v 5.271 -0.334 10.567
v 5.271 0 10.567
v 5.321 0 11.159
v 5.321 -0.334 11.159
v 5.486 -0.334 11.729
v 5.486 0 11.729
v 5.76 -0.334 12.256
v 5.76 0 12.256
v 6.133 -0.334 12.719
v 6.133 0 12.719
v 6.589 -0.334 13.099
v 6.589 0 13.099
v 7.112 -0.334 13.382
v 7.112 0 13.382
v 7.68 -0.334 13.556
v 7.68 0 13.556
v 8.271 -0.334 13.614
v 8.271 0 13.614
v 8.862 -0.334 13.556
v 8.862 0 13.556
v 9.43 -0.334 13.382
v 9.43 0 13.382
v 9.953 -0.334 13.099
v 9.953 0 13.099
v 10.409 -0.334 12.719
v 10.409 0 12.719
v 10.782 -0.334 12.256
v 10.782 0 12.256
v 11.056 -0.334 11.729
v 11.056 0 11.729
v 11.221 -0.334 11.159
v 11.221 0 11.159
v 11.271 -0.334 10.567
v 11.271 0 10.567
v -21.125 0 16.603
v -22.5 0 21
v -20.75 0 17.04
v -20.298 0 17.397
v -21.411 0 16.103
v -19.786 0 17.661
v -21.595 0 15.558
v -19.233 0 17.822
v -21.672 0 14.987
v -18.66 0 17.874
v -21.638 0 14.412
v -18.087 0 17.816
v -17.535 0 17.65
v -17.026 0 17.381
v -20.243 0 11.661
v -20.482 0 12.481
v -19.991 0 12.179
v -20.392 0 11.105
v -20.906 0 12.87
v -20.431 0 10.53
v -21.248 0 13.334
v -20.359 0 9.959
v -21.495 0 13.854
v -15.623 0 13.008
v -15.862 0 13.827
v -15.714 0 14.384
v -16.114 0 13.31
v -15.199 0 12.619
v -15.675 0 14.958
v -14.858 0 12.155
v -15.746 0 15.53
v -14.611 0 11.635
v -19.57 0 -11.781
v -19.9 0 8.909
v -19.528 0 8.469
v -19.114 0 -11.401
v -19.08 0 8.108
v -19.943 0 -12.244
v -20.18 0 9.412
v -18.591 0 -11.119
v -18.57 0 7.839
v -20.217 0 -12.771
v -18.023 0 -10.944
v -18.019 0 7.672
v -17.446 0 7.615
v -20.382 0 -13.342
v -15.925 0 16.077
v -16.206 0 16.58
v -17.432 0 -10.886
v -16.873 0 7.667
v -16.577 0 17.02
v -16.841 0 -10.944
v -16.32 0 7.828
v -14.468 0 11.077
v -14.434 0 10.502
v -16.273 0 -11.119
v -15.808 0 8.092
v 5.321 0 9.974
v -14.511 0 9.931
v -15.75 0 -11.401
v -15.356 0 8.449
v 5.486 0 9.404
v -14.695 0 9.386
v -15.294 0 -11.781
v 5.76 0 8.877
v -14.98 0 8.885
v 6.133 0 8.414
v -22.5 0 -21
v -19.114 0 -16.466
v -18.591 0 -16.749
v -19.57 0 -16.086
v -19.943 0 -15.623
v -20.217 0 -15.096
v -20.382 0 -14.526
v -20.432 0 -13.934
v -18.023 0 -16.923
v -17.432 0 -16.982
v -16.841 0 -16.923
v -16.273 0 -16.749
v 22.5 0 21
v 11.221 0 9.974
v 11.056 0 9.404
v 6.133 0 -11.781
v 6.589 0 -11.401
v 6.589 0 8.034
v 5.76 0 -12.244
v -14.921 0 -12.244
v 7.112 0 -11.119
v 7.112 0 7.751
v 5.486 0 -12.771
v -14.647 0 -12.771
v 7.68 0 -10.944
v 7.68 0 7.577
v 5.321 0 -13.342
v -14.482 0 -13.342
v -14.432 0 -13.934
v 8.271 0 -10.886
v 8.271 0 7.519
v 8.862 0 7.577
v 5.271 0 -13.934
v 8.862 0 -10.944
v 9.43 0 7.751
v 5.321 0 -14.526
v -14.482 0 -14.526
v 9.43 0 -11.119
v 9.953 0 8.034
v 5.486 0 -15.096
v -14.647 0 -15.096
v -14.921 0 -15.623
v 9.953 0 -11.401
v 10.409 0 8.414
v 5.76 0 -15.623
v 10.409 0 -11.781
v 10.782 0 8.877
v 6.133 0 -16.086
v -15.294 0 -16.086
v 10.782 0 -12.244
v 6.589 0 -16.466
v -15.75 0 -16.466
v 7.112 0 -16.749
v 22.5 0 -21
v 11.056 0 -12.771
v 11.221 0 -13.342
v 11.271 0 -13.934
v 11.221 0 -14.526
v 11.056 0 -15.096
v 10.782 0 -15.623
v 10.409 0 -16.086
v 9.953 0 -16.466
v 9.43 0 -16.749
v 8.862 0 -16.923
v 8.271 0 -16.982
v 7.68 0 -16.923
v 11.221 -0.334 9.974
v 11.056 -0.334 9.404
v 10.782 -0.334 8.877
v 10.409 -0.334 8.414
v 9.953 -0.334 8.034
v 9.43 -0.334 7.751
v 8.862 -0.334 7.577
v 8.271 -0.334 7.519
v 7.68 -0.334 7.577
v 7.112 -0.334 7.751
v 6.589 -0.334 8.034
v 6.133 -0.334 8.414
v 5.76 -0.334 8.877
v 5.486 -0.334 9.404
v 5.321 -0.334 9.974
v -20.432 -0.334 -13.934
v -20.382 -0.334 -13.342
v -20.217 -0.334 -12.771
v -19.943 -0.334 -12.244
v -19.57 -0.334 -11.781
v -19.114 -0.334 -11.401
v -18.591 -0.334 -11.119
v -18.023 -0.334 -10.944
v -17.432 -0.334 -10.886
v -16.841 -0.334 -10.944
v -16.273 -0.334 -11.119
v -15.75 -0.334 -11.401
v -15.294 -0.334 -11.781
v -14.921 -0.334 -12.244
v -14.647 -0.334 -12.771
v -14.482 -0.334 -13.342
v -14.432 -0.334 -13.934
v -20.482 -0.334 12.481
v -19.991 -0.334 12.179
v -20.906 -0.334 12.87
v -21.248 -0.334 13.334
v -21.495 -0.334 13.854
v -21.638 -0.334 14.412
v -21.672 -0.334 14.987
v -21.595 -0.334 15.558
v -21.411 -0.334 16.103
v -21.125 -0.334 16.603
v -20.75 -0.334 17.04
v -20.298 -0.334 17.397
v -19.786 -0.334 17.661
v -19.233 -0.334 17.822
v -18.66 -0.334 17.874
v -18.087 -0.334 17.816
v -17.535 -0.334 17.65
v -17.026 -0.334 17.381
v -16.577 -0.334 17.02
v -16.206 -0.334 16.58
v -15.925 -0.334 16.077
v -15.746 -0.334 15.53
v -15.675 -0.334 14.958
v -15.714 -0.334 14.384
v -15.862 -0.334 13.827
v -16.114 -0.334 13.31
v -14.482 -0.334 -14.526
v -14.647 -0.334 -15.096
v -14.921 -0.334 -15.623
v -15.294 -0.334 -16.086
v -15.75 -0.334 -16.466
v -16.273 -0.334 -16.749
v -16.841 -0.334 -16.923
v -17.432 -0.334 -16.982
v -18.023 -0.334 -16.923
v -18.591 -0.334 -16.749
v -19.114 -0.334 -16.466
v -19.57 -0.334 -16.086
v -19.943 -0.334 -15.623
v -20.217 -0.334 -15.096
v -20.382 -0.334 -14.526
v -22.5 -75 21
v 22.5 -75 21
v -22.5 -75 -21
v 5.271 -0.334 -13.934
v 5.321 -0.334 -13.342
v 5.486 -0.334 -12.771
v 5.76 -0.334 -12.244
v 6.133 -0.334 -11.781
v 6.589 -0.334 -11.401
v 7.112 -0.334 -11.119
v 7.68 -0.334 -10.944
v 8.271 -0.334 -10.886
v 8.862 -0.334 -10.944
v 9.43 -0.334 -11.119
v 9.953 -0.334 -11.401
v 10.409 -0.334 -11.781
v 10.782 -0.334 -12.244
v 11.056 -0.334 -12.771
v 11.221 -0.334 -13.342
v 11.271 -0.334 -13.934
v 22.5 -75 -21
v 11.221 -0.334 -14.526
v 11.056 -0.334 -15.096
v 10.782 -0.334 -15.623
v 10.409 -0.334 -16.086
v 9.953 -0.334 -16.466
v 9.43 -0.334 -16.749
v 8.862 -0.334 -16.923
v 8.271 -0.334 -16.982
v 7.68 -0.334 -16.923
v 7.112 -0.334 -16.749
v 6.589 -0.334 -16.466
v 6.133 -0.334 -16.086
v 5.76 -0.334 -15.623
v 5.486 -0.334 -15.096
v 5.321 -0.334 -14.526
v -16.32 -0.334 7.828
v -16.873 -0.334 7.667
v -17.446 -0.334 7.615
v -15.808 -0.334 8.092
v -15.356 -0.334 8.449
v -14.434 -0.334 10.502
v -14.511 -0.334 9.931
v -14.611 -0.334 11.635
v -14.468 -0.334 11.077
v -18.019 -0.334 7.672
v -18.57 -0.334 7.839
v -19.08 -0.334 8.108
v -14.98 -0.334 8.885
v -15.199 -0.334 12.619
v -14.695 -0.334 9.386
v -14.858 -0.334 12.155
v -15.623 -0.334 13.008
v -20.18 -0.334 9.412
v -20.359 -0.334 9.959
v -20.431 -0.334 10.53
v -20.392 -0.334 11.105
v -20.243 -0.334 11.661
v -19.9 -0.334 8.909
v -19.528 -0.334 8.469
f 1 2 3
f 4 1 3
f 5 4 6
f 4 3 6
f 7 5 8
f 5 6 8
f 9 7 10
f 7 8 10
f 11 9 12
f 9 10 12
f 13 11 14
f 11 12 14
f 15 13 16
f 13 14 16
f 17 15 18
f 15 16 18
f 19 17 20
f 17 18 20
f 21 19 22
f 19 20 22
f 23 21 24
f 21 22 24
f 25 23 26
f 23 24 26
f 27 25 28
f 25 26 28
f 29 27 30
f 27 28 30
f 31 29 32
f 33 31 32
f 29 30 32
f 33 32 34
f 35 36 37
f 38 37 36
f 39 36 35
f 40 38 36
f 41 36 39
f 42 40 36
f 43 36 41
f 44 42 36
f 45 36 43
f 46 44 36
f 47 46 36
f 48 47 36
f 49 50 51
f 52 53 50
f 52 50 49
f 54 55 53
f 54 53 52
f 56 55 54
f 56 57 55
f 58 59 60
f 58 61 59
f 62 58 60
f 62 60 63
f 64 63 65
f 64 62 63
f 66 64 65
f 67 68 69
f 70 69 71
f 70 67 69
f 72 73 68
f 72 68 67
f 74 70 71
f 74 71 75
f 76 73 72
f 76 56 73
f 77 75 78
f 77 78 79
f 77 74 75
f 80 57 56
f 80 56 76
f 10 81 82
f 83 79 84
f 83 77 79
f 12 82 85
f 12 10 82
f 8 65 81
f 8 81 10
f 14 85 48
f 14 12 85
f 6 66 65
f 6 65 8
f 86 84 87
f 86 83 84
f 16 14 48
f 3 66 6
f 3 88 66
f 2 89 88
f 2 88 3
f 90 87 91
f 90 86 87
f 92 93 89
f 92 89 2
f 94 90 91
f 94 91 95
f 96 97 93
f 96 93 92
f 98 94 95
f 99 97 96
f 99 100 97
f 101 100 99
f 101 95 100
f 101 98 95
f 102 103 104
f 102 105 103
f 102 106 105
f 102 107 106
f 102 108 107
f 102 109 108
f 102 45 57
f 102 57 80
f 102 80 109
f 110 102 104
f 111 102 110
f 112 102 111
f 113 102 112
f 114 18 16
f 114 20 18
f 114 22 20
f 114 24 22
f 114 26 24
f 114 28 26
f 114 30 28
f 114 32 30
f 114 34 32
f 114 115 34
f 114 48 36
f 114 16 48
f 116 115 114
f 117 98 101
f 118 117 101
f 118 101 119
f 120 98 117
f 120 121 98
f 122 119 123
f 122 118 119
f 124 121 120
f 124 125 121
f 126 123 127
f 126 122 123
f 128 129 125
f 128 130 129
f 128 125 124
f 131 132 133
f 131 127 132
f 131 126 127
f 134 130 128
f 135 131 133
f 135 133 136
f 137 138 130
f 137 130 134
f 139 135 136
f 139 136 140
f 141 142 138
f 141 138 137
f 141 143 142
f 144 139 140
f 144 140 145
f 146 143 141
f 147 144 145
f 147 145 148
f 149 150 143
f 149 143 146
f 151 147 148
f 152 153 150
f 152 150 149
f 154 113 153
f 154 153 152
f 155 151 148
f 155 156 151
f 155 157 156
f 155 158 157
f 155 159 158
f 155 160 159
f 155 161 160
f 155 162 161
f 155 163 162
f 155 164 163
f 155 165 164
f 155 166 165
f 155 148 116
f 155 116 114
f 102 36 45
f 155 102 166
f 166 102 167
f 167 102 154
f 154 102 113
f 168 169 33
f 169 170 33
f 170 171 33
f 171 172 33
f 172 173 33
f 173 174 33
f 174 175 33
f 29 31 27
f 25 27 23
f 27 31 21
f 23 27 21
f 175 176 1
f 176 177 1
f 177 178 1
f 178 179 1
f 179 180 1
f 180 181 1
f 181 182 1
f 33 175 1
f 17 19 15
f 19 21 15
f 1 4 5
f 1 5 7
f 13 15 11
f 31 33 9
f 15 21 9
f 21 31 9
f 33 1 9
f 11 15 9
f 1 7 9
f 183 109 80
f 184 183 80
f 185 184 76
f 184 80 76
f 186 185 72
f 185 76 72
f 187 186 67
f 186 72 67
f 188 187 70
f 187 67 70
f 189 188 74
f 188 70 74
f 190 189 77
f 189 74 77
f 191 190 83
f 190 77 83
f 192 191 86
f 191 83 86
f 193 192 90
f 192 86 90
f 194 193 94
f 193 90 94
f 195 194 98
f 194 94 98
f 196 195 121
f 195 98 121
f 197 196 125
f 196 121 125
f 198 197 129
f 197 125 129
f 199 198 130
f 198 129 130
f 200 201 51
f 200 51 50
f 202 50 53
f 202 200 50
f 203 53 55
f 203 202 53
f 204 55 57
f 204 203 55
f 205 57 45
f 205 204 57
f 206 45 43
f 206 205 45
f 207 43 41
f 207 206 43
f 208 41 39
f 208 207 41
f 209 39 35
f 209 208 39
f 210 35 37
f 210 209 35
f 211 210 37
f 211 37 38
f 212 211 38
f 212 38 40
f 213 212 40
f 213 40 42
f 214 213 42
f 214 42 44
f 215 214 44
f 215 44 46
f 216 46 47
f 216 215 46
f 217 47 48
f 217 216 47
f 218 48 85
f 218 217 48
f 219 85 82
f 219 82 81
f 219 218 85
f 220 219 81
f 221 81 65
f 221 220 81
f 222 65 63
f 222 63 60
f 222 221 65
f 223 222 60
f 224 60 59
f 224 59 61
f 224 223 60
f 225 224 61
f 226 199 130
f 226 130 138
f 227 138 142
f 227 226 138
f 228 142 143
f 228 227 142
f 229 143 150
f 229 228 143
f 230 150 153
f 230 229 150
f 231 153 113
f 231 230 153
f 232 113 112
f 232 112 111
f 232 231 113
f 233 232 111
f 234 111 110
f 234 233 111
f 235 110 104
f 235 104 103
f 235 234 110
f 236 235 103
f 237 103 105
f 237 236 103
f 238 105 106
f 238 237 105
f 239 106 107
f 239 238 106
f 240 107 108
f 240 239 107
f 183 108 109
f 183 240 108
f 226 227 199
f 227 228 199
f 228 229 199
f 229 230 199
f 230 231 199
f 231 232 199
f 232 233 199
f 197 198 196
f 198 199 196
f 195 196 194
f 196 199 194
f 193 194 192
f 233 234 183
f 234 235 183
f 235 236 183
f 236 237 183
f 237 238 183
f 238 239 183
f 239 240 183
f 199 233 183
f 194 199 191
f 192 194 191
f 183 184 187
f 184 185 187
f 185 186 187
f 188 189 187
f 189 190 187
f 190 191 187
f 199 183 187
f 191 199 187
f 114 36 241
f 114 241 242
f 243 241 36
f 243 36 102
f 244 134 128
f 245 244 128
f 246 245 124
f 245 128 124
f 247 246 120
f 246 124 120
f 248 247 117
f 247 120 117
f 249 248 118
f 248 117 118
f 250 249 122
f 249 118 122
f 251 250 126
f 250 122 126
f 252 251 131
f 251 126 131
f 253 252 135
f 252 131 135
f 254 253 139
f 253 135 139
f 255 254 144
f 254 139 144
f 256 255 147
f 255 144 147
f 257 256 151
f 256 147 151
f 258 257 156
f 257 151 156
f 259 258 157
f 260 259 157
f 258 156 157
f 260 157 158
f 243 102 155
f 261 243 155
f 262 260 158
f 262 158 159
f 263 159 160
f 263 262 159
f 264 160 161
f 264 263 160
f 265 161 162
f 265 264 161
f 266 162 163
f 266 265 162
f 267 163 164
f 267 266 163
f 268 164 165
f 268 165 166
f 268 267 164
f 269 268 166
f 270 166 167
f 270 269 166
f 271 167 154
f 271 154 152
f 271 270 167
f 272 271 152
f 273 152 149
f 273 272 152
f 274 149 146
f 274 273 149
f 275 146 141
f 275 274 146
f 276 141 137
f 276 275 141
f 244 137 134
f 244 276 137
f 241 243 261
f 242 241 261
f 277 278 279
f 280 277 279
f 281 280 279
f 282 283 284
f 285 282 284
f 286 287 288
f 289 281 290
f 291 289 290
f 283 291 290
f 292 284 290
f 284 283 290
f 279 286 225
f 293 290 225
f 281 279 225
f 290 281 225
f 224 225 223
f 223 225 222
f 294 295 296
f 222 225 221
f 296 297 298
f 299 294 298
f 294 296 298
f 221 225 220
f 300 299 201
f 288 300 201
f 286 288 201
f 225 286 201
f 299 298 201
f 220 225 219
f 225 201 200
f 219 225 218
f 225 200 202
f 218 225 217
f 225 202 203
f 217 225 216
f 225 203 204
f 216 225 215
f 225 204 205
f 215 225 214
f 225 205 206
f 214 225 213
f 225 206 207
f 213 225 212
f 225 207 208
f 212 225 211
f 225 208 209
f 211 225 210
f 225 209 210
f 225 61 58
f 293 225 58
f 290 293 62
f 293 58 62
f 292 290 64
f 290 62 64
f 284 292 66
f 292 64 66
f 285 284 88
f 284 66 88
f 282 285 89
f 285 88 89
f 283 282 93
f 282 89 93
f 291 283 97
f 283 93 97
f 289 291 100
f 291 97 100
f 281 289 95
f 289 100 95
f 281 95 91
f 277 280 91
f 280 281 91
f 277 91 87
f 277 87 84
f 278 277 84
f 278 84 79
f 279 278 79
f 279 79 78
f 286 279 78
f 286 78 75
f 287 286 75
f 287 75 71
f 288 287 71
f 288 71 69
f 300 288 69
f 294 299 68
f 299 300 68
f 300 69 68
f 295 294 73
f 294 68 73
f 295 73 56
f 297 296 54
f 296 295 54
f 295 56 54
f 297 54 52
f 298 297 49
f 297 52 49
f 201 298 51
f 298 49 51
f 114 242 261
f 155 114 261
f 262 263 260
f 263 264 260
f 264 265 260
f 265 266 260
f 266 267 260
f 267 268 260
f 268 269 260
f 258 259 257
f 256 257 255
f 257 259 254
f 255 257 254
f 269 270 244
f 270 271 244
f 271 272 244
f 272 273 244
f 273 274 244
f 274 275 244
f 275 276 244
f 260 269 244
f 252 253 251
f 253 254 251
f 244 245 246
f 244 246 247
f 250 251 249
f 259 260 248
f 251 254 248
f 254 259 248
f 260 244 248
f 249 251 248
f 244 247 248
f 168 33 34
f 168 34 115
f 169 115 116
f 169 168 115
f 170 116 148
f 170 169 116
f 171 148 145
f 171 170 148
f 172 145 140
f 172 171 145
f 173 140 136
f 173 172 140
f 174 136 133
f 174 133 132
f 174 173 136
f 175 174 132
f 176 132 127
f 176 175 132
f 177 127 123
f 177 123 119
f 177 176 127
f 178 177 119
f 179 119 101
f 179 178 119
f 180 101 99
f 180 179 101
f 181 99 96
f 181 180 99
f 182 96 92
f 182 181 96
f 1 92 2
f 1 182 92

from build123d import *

# Parameters (mm, degrees)
CROQUIS1_W                            = 45
CROQUIS1_H                            = 42
SALIENTE_EXTRUIR1_DEPTH               = 75
CROQUIS3_W                            = 3
CROQUIS3_H                            = 1
TALADRO_DE_MARGEN_PARA_M61_AT_2_COUNT = 2
TALADRO_DE_MARGEN_PARA_M61_AT_2_PITCH = 25.702920672
TALADRO_DE_MARGEN_PARA_M61_AT_3_COUNT = 2
TALADRO_DE_MARGEN_PARA_M61_AT_3_PITCH = 35.509059169
TALADRO_DE_MARGEN_PARA_M61_AT_4_COUNT = 2
TALADRO_DE_MARGEN_PARA_M61_AT_4_PITCH = 24.500064327
TALADRO_START                         = -0.333644058
TALADRO_DE_MARGEN_PARA_M62_DEPTH      = 0.333644058


# Read off the part's stored shape, not the designer's step: Taladro de margen para M62
with BuildPart() as part:
    # Croquis1 → Saliente-Extruir1 (new body)
    with BuildSketch(Plane(origin=(0, 0, 0), x_dir=(1, 0, 0), z_dir=(0, 1, 0))):
        Rectangle(CROQUIS1_W, CROQUIS1_H)
    extrude(amount=-SALIENTE_EXTRUIR1_DEPTH)

    # Croquis3 → Taladro de margen para M61 (revolve, cut)
    with BuildSketch(Plane(origin=(8.271017264, -0.333644058, -13.885573428), x_dir=(0, 0, -1), z_dir=(1, 0, 0))):
        with Locations((1.5, 0.5)):
            Rectangle(CROQUIS3_W, CROQUIS3_H)
    taladro_de_margen_para_m61 = revolve(axis=Axis((8.271017264, -6.683644058, -13.885573428), (0, 1, 0)), mode=Mode.SUBTRACT)

    # Taladro de margen para M61 at 2: Taladro de margen para M61 ×2
    with Locations(*[(-i * TALADRO_DE_MARGEN_PARA_M61_AT_2_PITCH, 0, 0) for i in range(1, TALADRO_DE_MARGEN_PARA_M61_AT_2_COUNT)]):
        add(taladro_de_margen_para_m61, mode=Mode.SUBTRACT)

    # Taladro de margen para M61 at 3: Taladro de margen para M61 ×2
    with Locations(*[Vector(-0.7238412189178528, 0, 0.6899665859992912) * (i * TALADRO_DE_MARGEN_PARA_M61_AT_3_PITCH) for i in range(1, TALADRO_DE_MARGEN_PARA_M61_AT_3_COUNT)]):
        add(taladro_de_margen_para_m61, mode=Mode.SUBTRACT)

    # Taladro de margen para M61 at 4: Taladro de margen para M61 ×2
    with Locations(*[(0, 0, i * TALADRO_DE_MARGEN_PARA_M61_AT_4_PITCH) for i in range(1, TALADRO_DE_MARGEN_PARA_M61_AT_4_COUNT)]):
        add(taladro_de_margen_para_m61, mode=Mode.SUBTRACT)

    # Taladro de margen para M62 outline → Taladro de margen para M62 (cut)
    with BuildSketch(Plane(origin=(0, 0, 0), x_dir=(1, 0, 0), z_dir=(0, 1, 0)).offset(TALADRO_START)):
        with BuildLine():
            ThreePointArc((11.270633402, -10.566501054), (8.271017264, -7.518511209), (5.271401126, -10.566501054))
            ThreePointArc((5.271401126, -10.566501054), (8.271017264, -7.614490899), (11.270633402, -10.566501054))
        make_face()
        with BuildLine():
            ThreePointArc((-19.991497807, -12.179251747), (-19.51338327, -17.754461658), (-16.114164948, -13.309591147))
            ThreePointArc((-16.114164948, -13.309591147), (-18.271527332, -13.494600561), (-19.991497807, -12.179251747))
        make_face()
        with BuildLine():
            ThreePointArc((-14.43228727, 13.933563273), (-17.431903408, 16.981553118), (-20.431519546, 13.933563273))
            ThreePointArc((-20.431519546, 13.933563273), (-17.431903408, 16.885573428), (-14.43228727, 13.933563273))
        make_face()
        with BuildLine():
            ThreePointArc((11.270633402, 13.933563273), (8.271017264, 16.981553118), (5.271401126, 13.933563273))
            ThreePointArc((5.271401126, 13.933563273), (8.271017264, 16.885573428), (11.270633402, 13.933563273))
        make_face()
    extrude(amount=TALADRO_DE_MARGEN_PARA_M62_DEPTH, mode=Mode.SUBTRACT)


solid = part.part
